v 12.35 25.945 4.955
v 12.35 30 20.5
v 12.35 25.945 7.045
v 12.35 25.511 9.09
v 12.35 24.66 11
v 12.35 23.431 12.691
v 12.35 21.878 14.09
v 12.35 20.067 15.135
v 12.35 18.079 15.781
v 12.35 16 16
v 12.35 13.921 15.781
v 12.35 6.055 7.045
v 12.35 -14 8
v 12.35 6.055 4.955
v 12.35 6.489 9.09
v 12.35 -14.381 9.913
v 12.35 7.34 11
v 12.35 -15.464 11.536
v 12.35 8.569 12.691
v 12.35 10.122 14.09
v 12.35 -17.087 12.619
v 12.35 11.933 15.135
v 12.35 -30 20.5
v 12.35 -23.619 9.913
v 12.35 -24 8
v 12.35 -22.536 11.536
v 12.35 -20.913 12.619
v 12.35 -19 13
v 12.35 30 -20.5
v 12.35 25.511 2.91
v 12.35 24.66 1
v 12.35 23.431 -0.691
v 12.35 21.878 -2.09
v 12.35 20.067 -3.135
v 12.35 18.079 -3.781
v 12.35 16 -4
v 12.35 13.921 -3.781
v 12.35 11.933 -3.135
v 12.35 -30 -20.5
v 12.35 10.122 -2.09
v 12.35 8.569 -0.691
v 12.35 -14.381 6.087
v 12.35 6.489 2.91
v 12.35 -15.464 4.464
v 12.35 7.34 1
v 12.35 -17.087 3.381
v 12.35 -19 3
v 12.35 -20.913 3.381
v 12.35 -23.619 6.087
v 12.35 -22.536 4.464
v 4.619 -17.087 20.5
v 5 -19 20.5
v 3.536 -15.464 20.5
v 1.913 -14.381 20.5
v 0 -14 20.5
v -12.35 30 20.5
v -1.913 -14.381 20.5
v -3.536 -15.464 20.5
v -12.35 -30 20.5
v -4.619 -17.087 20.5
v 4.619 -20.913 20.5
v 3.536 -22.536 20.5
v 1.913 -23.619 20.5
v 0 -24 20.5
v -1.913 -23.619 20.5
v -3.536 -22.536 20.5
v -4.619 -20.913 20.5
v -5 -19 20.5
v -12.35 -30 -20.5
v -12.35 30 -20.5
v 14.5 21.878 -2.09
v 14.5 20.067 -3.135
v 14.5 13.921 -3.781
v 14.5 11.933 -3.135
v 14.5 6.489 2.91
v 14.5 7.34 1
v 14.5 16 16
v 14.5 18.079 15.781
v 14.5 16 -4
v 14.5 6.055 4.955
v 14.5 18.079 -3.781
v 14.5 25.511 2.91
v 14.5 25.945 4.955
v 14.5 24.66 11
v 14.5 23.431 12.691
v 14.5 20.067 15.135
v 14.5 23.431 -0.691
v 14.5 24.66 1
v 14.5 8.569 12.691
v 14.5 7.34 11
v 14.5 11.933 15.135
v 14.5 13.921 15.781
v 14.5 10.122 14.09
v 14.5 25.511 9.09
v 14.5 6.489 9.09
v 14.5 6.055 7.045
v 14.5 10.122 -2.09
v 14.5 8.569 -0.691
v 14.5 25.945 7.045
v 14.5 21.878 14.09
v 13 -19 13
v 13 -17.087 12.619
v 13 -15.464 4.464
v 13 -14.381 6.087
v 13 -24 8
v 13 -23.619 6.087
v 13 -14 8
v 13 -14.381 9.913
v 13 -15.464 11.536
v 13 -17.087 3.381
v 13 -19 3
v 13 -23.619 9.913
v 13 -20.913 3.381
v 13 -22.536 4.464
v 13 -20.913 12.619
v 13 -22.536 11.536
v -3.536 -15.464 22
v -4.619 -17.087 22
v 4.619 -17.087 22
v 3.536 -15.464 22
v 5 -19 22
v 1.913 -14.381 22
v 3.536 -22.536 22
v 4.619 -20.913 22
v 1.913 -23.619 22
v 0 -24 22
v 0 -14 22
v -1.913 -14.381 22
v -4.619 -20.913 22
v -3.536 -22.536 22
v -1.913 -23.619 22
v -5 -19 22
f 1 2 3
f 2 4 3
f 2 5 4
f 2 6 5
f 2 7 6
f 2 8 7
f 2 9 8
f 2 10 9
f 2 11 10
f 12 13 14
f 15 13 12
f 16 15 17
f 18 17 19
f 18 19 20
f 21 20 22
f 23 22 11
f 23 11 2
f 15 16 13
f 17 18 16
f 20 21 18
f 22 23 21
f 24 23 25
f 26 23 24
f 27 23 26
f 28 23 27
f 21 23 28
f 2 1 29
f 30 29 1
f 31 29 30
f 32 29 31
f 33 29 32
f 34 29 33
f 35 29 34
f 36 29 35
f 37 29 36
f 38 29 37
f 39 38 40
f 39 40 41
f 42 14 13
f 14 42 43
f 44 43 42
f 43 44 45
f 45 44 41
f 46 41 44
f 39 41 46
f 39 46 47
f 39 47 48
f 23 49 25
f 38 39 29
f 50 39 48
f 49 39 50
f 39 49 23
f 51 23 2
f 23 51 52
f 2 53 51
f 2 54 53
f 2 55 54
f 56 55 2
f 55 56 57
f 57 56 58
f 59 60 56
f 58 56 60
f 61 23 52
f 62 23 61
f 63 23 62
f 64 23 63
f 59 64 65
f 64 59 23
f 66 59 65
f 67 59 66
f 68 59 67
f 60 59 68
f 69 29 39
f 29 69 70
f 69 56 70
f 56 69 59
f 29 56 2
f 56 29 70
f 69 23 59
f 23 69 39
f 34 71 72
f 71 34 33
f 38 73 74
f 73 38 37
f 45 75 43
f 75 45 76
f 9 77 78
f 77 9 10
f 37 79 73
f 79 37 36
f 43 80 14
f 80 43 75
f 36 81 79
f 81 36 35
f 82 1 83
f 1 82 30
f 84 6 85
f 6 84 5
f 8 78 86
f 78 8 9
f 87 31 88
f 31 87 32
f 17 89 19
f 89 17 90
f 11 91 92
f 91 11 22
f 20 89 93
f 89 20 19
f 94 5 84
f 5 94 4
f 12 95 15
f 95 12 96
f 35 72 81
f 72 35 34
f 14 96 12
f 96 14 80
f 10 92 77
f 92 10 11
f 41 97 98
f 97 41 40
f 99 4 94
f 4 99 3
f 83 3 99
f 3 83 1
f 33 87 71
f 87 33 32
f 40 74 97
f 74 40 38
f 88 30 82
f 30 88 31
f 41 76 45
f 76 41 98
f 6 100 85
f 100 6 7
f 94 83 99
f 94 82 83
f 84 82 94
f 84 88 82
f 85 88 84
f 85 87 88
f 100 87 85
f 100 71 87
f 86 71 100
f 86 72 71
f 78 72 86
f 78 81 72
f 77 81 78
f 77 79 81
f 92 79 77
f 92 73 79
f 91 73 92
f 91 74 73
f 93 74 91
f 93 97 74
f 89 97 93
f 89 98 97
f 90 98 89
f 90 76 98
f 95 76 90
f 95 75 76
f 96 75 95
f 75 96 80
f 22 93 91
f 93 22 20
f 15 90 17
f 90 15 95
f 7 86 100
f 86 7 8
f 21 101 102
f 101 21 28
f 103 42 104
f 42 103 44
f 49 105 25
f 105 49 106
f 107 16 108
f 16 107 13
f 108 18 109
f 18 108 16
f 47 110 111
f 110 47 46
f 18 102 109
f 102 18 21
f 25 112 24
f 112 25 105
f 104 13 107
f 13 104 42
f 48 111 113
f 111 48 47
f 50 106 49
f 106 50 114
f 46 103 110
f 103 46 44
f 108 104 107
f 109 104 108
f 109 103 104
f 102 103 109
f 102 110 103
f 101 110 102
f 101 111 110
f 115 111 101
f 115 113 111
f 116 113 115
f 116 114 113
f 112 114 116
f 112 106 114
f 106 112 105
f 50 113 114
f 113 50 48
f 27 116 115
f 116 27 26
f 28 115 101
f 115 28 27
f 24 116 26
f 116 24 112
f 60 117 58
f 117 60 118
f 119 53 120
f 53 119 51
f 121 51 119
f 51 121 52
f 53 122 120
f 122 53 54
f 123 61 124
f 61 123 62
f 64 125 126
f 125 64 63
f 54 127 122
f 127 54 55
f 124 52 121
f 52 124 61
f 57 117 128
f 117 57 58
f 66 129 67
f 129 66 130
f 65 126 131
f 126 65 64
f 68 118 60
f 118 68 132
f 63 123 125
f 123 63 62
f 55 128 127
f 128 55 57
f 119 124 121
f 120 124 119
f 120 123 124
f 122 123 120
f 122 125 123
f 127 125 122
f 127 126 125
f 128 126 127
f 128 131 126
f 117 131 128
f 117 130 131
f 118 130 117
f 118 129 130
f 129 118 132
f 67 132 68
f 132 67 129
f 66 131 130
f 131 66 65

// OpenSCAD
union(){
// camera body
color("dimgray")
cube(size = [24.7, 60, 41], center = true);

// lens
color("deepskyblue")
translate([12, 16, 6])
rotate([0,90,0])
cylinder(h = 5, r = 10, center = true);

// power button
color("gray")
translate([12, -19, 8])
rotate([0,90,0])
cylinder(h = 2, r = 5, center = true);

// ok button
color("gray")
translate([0, -19, 21])
cylinder(h = 2, r = 5, center = true);
}
